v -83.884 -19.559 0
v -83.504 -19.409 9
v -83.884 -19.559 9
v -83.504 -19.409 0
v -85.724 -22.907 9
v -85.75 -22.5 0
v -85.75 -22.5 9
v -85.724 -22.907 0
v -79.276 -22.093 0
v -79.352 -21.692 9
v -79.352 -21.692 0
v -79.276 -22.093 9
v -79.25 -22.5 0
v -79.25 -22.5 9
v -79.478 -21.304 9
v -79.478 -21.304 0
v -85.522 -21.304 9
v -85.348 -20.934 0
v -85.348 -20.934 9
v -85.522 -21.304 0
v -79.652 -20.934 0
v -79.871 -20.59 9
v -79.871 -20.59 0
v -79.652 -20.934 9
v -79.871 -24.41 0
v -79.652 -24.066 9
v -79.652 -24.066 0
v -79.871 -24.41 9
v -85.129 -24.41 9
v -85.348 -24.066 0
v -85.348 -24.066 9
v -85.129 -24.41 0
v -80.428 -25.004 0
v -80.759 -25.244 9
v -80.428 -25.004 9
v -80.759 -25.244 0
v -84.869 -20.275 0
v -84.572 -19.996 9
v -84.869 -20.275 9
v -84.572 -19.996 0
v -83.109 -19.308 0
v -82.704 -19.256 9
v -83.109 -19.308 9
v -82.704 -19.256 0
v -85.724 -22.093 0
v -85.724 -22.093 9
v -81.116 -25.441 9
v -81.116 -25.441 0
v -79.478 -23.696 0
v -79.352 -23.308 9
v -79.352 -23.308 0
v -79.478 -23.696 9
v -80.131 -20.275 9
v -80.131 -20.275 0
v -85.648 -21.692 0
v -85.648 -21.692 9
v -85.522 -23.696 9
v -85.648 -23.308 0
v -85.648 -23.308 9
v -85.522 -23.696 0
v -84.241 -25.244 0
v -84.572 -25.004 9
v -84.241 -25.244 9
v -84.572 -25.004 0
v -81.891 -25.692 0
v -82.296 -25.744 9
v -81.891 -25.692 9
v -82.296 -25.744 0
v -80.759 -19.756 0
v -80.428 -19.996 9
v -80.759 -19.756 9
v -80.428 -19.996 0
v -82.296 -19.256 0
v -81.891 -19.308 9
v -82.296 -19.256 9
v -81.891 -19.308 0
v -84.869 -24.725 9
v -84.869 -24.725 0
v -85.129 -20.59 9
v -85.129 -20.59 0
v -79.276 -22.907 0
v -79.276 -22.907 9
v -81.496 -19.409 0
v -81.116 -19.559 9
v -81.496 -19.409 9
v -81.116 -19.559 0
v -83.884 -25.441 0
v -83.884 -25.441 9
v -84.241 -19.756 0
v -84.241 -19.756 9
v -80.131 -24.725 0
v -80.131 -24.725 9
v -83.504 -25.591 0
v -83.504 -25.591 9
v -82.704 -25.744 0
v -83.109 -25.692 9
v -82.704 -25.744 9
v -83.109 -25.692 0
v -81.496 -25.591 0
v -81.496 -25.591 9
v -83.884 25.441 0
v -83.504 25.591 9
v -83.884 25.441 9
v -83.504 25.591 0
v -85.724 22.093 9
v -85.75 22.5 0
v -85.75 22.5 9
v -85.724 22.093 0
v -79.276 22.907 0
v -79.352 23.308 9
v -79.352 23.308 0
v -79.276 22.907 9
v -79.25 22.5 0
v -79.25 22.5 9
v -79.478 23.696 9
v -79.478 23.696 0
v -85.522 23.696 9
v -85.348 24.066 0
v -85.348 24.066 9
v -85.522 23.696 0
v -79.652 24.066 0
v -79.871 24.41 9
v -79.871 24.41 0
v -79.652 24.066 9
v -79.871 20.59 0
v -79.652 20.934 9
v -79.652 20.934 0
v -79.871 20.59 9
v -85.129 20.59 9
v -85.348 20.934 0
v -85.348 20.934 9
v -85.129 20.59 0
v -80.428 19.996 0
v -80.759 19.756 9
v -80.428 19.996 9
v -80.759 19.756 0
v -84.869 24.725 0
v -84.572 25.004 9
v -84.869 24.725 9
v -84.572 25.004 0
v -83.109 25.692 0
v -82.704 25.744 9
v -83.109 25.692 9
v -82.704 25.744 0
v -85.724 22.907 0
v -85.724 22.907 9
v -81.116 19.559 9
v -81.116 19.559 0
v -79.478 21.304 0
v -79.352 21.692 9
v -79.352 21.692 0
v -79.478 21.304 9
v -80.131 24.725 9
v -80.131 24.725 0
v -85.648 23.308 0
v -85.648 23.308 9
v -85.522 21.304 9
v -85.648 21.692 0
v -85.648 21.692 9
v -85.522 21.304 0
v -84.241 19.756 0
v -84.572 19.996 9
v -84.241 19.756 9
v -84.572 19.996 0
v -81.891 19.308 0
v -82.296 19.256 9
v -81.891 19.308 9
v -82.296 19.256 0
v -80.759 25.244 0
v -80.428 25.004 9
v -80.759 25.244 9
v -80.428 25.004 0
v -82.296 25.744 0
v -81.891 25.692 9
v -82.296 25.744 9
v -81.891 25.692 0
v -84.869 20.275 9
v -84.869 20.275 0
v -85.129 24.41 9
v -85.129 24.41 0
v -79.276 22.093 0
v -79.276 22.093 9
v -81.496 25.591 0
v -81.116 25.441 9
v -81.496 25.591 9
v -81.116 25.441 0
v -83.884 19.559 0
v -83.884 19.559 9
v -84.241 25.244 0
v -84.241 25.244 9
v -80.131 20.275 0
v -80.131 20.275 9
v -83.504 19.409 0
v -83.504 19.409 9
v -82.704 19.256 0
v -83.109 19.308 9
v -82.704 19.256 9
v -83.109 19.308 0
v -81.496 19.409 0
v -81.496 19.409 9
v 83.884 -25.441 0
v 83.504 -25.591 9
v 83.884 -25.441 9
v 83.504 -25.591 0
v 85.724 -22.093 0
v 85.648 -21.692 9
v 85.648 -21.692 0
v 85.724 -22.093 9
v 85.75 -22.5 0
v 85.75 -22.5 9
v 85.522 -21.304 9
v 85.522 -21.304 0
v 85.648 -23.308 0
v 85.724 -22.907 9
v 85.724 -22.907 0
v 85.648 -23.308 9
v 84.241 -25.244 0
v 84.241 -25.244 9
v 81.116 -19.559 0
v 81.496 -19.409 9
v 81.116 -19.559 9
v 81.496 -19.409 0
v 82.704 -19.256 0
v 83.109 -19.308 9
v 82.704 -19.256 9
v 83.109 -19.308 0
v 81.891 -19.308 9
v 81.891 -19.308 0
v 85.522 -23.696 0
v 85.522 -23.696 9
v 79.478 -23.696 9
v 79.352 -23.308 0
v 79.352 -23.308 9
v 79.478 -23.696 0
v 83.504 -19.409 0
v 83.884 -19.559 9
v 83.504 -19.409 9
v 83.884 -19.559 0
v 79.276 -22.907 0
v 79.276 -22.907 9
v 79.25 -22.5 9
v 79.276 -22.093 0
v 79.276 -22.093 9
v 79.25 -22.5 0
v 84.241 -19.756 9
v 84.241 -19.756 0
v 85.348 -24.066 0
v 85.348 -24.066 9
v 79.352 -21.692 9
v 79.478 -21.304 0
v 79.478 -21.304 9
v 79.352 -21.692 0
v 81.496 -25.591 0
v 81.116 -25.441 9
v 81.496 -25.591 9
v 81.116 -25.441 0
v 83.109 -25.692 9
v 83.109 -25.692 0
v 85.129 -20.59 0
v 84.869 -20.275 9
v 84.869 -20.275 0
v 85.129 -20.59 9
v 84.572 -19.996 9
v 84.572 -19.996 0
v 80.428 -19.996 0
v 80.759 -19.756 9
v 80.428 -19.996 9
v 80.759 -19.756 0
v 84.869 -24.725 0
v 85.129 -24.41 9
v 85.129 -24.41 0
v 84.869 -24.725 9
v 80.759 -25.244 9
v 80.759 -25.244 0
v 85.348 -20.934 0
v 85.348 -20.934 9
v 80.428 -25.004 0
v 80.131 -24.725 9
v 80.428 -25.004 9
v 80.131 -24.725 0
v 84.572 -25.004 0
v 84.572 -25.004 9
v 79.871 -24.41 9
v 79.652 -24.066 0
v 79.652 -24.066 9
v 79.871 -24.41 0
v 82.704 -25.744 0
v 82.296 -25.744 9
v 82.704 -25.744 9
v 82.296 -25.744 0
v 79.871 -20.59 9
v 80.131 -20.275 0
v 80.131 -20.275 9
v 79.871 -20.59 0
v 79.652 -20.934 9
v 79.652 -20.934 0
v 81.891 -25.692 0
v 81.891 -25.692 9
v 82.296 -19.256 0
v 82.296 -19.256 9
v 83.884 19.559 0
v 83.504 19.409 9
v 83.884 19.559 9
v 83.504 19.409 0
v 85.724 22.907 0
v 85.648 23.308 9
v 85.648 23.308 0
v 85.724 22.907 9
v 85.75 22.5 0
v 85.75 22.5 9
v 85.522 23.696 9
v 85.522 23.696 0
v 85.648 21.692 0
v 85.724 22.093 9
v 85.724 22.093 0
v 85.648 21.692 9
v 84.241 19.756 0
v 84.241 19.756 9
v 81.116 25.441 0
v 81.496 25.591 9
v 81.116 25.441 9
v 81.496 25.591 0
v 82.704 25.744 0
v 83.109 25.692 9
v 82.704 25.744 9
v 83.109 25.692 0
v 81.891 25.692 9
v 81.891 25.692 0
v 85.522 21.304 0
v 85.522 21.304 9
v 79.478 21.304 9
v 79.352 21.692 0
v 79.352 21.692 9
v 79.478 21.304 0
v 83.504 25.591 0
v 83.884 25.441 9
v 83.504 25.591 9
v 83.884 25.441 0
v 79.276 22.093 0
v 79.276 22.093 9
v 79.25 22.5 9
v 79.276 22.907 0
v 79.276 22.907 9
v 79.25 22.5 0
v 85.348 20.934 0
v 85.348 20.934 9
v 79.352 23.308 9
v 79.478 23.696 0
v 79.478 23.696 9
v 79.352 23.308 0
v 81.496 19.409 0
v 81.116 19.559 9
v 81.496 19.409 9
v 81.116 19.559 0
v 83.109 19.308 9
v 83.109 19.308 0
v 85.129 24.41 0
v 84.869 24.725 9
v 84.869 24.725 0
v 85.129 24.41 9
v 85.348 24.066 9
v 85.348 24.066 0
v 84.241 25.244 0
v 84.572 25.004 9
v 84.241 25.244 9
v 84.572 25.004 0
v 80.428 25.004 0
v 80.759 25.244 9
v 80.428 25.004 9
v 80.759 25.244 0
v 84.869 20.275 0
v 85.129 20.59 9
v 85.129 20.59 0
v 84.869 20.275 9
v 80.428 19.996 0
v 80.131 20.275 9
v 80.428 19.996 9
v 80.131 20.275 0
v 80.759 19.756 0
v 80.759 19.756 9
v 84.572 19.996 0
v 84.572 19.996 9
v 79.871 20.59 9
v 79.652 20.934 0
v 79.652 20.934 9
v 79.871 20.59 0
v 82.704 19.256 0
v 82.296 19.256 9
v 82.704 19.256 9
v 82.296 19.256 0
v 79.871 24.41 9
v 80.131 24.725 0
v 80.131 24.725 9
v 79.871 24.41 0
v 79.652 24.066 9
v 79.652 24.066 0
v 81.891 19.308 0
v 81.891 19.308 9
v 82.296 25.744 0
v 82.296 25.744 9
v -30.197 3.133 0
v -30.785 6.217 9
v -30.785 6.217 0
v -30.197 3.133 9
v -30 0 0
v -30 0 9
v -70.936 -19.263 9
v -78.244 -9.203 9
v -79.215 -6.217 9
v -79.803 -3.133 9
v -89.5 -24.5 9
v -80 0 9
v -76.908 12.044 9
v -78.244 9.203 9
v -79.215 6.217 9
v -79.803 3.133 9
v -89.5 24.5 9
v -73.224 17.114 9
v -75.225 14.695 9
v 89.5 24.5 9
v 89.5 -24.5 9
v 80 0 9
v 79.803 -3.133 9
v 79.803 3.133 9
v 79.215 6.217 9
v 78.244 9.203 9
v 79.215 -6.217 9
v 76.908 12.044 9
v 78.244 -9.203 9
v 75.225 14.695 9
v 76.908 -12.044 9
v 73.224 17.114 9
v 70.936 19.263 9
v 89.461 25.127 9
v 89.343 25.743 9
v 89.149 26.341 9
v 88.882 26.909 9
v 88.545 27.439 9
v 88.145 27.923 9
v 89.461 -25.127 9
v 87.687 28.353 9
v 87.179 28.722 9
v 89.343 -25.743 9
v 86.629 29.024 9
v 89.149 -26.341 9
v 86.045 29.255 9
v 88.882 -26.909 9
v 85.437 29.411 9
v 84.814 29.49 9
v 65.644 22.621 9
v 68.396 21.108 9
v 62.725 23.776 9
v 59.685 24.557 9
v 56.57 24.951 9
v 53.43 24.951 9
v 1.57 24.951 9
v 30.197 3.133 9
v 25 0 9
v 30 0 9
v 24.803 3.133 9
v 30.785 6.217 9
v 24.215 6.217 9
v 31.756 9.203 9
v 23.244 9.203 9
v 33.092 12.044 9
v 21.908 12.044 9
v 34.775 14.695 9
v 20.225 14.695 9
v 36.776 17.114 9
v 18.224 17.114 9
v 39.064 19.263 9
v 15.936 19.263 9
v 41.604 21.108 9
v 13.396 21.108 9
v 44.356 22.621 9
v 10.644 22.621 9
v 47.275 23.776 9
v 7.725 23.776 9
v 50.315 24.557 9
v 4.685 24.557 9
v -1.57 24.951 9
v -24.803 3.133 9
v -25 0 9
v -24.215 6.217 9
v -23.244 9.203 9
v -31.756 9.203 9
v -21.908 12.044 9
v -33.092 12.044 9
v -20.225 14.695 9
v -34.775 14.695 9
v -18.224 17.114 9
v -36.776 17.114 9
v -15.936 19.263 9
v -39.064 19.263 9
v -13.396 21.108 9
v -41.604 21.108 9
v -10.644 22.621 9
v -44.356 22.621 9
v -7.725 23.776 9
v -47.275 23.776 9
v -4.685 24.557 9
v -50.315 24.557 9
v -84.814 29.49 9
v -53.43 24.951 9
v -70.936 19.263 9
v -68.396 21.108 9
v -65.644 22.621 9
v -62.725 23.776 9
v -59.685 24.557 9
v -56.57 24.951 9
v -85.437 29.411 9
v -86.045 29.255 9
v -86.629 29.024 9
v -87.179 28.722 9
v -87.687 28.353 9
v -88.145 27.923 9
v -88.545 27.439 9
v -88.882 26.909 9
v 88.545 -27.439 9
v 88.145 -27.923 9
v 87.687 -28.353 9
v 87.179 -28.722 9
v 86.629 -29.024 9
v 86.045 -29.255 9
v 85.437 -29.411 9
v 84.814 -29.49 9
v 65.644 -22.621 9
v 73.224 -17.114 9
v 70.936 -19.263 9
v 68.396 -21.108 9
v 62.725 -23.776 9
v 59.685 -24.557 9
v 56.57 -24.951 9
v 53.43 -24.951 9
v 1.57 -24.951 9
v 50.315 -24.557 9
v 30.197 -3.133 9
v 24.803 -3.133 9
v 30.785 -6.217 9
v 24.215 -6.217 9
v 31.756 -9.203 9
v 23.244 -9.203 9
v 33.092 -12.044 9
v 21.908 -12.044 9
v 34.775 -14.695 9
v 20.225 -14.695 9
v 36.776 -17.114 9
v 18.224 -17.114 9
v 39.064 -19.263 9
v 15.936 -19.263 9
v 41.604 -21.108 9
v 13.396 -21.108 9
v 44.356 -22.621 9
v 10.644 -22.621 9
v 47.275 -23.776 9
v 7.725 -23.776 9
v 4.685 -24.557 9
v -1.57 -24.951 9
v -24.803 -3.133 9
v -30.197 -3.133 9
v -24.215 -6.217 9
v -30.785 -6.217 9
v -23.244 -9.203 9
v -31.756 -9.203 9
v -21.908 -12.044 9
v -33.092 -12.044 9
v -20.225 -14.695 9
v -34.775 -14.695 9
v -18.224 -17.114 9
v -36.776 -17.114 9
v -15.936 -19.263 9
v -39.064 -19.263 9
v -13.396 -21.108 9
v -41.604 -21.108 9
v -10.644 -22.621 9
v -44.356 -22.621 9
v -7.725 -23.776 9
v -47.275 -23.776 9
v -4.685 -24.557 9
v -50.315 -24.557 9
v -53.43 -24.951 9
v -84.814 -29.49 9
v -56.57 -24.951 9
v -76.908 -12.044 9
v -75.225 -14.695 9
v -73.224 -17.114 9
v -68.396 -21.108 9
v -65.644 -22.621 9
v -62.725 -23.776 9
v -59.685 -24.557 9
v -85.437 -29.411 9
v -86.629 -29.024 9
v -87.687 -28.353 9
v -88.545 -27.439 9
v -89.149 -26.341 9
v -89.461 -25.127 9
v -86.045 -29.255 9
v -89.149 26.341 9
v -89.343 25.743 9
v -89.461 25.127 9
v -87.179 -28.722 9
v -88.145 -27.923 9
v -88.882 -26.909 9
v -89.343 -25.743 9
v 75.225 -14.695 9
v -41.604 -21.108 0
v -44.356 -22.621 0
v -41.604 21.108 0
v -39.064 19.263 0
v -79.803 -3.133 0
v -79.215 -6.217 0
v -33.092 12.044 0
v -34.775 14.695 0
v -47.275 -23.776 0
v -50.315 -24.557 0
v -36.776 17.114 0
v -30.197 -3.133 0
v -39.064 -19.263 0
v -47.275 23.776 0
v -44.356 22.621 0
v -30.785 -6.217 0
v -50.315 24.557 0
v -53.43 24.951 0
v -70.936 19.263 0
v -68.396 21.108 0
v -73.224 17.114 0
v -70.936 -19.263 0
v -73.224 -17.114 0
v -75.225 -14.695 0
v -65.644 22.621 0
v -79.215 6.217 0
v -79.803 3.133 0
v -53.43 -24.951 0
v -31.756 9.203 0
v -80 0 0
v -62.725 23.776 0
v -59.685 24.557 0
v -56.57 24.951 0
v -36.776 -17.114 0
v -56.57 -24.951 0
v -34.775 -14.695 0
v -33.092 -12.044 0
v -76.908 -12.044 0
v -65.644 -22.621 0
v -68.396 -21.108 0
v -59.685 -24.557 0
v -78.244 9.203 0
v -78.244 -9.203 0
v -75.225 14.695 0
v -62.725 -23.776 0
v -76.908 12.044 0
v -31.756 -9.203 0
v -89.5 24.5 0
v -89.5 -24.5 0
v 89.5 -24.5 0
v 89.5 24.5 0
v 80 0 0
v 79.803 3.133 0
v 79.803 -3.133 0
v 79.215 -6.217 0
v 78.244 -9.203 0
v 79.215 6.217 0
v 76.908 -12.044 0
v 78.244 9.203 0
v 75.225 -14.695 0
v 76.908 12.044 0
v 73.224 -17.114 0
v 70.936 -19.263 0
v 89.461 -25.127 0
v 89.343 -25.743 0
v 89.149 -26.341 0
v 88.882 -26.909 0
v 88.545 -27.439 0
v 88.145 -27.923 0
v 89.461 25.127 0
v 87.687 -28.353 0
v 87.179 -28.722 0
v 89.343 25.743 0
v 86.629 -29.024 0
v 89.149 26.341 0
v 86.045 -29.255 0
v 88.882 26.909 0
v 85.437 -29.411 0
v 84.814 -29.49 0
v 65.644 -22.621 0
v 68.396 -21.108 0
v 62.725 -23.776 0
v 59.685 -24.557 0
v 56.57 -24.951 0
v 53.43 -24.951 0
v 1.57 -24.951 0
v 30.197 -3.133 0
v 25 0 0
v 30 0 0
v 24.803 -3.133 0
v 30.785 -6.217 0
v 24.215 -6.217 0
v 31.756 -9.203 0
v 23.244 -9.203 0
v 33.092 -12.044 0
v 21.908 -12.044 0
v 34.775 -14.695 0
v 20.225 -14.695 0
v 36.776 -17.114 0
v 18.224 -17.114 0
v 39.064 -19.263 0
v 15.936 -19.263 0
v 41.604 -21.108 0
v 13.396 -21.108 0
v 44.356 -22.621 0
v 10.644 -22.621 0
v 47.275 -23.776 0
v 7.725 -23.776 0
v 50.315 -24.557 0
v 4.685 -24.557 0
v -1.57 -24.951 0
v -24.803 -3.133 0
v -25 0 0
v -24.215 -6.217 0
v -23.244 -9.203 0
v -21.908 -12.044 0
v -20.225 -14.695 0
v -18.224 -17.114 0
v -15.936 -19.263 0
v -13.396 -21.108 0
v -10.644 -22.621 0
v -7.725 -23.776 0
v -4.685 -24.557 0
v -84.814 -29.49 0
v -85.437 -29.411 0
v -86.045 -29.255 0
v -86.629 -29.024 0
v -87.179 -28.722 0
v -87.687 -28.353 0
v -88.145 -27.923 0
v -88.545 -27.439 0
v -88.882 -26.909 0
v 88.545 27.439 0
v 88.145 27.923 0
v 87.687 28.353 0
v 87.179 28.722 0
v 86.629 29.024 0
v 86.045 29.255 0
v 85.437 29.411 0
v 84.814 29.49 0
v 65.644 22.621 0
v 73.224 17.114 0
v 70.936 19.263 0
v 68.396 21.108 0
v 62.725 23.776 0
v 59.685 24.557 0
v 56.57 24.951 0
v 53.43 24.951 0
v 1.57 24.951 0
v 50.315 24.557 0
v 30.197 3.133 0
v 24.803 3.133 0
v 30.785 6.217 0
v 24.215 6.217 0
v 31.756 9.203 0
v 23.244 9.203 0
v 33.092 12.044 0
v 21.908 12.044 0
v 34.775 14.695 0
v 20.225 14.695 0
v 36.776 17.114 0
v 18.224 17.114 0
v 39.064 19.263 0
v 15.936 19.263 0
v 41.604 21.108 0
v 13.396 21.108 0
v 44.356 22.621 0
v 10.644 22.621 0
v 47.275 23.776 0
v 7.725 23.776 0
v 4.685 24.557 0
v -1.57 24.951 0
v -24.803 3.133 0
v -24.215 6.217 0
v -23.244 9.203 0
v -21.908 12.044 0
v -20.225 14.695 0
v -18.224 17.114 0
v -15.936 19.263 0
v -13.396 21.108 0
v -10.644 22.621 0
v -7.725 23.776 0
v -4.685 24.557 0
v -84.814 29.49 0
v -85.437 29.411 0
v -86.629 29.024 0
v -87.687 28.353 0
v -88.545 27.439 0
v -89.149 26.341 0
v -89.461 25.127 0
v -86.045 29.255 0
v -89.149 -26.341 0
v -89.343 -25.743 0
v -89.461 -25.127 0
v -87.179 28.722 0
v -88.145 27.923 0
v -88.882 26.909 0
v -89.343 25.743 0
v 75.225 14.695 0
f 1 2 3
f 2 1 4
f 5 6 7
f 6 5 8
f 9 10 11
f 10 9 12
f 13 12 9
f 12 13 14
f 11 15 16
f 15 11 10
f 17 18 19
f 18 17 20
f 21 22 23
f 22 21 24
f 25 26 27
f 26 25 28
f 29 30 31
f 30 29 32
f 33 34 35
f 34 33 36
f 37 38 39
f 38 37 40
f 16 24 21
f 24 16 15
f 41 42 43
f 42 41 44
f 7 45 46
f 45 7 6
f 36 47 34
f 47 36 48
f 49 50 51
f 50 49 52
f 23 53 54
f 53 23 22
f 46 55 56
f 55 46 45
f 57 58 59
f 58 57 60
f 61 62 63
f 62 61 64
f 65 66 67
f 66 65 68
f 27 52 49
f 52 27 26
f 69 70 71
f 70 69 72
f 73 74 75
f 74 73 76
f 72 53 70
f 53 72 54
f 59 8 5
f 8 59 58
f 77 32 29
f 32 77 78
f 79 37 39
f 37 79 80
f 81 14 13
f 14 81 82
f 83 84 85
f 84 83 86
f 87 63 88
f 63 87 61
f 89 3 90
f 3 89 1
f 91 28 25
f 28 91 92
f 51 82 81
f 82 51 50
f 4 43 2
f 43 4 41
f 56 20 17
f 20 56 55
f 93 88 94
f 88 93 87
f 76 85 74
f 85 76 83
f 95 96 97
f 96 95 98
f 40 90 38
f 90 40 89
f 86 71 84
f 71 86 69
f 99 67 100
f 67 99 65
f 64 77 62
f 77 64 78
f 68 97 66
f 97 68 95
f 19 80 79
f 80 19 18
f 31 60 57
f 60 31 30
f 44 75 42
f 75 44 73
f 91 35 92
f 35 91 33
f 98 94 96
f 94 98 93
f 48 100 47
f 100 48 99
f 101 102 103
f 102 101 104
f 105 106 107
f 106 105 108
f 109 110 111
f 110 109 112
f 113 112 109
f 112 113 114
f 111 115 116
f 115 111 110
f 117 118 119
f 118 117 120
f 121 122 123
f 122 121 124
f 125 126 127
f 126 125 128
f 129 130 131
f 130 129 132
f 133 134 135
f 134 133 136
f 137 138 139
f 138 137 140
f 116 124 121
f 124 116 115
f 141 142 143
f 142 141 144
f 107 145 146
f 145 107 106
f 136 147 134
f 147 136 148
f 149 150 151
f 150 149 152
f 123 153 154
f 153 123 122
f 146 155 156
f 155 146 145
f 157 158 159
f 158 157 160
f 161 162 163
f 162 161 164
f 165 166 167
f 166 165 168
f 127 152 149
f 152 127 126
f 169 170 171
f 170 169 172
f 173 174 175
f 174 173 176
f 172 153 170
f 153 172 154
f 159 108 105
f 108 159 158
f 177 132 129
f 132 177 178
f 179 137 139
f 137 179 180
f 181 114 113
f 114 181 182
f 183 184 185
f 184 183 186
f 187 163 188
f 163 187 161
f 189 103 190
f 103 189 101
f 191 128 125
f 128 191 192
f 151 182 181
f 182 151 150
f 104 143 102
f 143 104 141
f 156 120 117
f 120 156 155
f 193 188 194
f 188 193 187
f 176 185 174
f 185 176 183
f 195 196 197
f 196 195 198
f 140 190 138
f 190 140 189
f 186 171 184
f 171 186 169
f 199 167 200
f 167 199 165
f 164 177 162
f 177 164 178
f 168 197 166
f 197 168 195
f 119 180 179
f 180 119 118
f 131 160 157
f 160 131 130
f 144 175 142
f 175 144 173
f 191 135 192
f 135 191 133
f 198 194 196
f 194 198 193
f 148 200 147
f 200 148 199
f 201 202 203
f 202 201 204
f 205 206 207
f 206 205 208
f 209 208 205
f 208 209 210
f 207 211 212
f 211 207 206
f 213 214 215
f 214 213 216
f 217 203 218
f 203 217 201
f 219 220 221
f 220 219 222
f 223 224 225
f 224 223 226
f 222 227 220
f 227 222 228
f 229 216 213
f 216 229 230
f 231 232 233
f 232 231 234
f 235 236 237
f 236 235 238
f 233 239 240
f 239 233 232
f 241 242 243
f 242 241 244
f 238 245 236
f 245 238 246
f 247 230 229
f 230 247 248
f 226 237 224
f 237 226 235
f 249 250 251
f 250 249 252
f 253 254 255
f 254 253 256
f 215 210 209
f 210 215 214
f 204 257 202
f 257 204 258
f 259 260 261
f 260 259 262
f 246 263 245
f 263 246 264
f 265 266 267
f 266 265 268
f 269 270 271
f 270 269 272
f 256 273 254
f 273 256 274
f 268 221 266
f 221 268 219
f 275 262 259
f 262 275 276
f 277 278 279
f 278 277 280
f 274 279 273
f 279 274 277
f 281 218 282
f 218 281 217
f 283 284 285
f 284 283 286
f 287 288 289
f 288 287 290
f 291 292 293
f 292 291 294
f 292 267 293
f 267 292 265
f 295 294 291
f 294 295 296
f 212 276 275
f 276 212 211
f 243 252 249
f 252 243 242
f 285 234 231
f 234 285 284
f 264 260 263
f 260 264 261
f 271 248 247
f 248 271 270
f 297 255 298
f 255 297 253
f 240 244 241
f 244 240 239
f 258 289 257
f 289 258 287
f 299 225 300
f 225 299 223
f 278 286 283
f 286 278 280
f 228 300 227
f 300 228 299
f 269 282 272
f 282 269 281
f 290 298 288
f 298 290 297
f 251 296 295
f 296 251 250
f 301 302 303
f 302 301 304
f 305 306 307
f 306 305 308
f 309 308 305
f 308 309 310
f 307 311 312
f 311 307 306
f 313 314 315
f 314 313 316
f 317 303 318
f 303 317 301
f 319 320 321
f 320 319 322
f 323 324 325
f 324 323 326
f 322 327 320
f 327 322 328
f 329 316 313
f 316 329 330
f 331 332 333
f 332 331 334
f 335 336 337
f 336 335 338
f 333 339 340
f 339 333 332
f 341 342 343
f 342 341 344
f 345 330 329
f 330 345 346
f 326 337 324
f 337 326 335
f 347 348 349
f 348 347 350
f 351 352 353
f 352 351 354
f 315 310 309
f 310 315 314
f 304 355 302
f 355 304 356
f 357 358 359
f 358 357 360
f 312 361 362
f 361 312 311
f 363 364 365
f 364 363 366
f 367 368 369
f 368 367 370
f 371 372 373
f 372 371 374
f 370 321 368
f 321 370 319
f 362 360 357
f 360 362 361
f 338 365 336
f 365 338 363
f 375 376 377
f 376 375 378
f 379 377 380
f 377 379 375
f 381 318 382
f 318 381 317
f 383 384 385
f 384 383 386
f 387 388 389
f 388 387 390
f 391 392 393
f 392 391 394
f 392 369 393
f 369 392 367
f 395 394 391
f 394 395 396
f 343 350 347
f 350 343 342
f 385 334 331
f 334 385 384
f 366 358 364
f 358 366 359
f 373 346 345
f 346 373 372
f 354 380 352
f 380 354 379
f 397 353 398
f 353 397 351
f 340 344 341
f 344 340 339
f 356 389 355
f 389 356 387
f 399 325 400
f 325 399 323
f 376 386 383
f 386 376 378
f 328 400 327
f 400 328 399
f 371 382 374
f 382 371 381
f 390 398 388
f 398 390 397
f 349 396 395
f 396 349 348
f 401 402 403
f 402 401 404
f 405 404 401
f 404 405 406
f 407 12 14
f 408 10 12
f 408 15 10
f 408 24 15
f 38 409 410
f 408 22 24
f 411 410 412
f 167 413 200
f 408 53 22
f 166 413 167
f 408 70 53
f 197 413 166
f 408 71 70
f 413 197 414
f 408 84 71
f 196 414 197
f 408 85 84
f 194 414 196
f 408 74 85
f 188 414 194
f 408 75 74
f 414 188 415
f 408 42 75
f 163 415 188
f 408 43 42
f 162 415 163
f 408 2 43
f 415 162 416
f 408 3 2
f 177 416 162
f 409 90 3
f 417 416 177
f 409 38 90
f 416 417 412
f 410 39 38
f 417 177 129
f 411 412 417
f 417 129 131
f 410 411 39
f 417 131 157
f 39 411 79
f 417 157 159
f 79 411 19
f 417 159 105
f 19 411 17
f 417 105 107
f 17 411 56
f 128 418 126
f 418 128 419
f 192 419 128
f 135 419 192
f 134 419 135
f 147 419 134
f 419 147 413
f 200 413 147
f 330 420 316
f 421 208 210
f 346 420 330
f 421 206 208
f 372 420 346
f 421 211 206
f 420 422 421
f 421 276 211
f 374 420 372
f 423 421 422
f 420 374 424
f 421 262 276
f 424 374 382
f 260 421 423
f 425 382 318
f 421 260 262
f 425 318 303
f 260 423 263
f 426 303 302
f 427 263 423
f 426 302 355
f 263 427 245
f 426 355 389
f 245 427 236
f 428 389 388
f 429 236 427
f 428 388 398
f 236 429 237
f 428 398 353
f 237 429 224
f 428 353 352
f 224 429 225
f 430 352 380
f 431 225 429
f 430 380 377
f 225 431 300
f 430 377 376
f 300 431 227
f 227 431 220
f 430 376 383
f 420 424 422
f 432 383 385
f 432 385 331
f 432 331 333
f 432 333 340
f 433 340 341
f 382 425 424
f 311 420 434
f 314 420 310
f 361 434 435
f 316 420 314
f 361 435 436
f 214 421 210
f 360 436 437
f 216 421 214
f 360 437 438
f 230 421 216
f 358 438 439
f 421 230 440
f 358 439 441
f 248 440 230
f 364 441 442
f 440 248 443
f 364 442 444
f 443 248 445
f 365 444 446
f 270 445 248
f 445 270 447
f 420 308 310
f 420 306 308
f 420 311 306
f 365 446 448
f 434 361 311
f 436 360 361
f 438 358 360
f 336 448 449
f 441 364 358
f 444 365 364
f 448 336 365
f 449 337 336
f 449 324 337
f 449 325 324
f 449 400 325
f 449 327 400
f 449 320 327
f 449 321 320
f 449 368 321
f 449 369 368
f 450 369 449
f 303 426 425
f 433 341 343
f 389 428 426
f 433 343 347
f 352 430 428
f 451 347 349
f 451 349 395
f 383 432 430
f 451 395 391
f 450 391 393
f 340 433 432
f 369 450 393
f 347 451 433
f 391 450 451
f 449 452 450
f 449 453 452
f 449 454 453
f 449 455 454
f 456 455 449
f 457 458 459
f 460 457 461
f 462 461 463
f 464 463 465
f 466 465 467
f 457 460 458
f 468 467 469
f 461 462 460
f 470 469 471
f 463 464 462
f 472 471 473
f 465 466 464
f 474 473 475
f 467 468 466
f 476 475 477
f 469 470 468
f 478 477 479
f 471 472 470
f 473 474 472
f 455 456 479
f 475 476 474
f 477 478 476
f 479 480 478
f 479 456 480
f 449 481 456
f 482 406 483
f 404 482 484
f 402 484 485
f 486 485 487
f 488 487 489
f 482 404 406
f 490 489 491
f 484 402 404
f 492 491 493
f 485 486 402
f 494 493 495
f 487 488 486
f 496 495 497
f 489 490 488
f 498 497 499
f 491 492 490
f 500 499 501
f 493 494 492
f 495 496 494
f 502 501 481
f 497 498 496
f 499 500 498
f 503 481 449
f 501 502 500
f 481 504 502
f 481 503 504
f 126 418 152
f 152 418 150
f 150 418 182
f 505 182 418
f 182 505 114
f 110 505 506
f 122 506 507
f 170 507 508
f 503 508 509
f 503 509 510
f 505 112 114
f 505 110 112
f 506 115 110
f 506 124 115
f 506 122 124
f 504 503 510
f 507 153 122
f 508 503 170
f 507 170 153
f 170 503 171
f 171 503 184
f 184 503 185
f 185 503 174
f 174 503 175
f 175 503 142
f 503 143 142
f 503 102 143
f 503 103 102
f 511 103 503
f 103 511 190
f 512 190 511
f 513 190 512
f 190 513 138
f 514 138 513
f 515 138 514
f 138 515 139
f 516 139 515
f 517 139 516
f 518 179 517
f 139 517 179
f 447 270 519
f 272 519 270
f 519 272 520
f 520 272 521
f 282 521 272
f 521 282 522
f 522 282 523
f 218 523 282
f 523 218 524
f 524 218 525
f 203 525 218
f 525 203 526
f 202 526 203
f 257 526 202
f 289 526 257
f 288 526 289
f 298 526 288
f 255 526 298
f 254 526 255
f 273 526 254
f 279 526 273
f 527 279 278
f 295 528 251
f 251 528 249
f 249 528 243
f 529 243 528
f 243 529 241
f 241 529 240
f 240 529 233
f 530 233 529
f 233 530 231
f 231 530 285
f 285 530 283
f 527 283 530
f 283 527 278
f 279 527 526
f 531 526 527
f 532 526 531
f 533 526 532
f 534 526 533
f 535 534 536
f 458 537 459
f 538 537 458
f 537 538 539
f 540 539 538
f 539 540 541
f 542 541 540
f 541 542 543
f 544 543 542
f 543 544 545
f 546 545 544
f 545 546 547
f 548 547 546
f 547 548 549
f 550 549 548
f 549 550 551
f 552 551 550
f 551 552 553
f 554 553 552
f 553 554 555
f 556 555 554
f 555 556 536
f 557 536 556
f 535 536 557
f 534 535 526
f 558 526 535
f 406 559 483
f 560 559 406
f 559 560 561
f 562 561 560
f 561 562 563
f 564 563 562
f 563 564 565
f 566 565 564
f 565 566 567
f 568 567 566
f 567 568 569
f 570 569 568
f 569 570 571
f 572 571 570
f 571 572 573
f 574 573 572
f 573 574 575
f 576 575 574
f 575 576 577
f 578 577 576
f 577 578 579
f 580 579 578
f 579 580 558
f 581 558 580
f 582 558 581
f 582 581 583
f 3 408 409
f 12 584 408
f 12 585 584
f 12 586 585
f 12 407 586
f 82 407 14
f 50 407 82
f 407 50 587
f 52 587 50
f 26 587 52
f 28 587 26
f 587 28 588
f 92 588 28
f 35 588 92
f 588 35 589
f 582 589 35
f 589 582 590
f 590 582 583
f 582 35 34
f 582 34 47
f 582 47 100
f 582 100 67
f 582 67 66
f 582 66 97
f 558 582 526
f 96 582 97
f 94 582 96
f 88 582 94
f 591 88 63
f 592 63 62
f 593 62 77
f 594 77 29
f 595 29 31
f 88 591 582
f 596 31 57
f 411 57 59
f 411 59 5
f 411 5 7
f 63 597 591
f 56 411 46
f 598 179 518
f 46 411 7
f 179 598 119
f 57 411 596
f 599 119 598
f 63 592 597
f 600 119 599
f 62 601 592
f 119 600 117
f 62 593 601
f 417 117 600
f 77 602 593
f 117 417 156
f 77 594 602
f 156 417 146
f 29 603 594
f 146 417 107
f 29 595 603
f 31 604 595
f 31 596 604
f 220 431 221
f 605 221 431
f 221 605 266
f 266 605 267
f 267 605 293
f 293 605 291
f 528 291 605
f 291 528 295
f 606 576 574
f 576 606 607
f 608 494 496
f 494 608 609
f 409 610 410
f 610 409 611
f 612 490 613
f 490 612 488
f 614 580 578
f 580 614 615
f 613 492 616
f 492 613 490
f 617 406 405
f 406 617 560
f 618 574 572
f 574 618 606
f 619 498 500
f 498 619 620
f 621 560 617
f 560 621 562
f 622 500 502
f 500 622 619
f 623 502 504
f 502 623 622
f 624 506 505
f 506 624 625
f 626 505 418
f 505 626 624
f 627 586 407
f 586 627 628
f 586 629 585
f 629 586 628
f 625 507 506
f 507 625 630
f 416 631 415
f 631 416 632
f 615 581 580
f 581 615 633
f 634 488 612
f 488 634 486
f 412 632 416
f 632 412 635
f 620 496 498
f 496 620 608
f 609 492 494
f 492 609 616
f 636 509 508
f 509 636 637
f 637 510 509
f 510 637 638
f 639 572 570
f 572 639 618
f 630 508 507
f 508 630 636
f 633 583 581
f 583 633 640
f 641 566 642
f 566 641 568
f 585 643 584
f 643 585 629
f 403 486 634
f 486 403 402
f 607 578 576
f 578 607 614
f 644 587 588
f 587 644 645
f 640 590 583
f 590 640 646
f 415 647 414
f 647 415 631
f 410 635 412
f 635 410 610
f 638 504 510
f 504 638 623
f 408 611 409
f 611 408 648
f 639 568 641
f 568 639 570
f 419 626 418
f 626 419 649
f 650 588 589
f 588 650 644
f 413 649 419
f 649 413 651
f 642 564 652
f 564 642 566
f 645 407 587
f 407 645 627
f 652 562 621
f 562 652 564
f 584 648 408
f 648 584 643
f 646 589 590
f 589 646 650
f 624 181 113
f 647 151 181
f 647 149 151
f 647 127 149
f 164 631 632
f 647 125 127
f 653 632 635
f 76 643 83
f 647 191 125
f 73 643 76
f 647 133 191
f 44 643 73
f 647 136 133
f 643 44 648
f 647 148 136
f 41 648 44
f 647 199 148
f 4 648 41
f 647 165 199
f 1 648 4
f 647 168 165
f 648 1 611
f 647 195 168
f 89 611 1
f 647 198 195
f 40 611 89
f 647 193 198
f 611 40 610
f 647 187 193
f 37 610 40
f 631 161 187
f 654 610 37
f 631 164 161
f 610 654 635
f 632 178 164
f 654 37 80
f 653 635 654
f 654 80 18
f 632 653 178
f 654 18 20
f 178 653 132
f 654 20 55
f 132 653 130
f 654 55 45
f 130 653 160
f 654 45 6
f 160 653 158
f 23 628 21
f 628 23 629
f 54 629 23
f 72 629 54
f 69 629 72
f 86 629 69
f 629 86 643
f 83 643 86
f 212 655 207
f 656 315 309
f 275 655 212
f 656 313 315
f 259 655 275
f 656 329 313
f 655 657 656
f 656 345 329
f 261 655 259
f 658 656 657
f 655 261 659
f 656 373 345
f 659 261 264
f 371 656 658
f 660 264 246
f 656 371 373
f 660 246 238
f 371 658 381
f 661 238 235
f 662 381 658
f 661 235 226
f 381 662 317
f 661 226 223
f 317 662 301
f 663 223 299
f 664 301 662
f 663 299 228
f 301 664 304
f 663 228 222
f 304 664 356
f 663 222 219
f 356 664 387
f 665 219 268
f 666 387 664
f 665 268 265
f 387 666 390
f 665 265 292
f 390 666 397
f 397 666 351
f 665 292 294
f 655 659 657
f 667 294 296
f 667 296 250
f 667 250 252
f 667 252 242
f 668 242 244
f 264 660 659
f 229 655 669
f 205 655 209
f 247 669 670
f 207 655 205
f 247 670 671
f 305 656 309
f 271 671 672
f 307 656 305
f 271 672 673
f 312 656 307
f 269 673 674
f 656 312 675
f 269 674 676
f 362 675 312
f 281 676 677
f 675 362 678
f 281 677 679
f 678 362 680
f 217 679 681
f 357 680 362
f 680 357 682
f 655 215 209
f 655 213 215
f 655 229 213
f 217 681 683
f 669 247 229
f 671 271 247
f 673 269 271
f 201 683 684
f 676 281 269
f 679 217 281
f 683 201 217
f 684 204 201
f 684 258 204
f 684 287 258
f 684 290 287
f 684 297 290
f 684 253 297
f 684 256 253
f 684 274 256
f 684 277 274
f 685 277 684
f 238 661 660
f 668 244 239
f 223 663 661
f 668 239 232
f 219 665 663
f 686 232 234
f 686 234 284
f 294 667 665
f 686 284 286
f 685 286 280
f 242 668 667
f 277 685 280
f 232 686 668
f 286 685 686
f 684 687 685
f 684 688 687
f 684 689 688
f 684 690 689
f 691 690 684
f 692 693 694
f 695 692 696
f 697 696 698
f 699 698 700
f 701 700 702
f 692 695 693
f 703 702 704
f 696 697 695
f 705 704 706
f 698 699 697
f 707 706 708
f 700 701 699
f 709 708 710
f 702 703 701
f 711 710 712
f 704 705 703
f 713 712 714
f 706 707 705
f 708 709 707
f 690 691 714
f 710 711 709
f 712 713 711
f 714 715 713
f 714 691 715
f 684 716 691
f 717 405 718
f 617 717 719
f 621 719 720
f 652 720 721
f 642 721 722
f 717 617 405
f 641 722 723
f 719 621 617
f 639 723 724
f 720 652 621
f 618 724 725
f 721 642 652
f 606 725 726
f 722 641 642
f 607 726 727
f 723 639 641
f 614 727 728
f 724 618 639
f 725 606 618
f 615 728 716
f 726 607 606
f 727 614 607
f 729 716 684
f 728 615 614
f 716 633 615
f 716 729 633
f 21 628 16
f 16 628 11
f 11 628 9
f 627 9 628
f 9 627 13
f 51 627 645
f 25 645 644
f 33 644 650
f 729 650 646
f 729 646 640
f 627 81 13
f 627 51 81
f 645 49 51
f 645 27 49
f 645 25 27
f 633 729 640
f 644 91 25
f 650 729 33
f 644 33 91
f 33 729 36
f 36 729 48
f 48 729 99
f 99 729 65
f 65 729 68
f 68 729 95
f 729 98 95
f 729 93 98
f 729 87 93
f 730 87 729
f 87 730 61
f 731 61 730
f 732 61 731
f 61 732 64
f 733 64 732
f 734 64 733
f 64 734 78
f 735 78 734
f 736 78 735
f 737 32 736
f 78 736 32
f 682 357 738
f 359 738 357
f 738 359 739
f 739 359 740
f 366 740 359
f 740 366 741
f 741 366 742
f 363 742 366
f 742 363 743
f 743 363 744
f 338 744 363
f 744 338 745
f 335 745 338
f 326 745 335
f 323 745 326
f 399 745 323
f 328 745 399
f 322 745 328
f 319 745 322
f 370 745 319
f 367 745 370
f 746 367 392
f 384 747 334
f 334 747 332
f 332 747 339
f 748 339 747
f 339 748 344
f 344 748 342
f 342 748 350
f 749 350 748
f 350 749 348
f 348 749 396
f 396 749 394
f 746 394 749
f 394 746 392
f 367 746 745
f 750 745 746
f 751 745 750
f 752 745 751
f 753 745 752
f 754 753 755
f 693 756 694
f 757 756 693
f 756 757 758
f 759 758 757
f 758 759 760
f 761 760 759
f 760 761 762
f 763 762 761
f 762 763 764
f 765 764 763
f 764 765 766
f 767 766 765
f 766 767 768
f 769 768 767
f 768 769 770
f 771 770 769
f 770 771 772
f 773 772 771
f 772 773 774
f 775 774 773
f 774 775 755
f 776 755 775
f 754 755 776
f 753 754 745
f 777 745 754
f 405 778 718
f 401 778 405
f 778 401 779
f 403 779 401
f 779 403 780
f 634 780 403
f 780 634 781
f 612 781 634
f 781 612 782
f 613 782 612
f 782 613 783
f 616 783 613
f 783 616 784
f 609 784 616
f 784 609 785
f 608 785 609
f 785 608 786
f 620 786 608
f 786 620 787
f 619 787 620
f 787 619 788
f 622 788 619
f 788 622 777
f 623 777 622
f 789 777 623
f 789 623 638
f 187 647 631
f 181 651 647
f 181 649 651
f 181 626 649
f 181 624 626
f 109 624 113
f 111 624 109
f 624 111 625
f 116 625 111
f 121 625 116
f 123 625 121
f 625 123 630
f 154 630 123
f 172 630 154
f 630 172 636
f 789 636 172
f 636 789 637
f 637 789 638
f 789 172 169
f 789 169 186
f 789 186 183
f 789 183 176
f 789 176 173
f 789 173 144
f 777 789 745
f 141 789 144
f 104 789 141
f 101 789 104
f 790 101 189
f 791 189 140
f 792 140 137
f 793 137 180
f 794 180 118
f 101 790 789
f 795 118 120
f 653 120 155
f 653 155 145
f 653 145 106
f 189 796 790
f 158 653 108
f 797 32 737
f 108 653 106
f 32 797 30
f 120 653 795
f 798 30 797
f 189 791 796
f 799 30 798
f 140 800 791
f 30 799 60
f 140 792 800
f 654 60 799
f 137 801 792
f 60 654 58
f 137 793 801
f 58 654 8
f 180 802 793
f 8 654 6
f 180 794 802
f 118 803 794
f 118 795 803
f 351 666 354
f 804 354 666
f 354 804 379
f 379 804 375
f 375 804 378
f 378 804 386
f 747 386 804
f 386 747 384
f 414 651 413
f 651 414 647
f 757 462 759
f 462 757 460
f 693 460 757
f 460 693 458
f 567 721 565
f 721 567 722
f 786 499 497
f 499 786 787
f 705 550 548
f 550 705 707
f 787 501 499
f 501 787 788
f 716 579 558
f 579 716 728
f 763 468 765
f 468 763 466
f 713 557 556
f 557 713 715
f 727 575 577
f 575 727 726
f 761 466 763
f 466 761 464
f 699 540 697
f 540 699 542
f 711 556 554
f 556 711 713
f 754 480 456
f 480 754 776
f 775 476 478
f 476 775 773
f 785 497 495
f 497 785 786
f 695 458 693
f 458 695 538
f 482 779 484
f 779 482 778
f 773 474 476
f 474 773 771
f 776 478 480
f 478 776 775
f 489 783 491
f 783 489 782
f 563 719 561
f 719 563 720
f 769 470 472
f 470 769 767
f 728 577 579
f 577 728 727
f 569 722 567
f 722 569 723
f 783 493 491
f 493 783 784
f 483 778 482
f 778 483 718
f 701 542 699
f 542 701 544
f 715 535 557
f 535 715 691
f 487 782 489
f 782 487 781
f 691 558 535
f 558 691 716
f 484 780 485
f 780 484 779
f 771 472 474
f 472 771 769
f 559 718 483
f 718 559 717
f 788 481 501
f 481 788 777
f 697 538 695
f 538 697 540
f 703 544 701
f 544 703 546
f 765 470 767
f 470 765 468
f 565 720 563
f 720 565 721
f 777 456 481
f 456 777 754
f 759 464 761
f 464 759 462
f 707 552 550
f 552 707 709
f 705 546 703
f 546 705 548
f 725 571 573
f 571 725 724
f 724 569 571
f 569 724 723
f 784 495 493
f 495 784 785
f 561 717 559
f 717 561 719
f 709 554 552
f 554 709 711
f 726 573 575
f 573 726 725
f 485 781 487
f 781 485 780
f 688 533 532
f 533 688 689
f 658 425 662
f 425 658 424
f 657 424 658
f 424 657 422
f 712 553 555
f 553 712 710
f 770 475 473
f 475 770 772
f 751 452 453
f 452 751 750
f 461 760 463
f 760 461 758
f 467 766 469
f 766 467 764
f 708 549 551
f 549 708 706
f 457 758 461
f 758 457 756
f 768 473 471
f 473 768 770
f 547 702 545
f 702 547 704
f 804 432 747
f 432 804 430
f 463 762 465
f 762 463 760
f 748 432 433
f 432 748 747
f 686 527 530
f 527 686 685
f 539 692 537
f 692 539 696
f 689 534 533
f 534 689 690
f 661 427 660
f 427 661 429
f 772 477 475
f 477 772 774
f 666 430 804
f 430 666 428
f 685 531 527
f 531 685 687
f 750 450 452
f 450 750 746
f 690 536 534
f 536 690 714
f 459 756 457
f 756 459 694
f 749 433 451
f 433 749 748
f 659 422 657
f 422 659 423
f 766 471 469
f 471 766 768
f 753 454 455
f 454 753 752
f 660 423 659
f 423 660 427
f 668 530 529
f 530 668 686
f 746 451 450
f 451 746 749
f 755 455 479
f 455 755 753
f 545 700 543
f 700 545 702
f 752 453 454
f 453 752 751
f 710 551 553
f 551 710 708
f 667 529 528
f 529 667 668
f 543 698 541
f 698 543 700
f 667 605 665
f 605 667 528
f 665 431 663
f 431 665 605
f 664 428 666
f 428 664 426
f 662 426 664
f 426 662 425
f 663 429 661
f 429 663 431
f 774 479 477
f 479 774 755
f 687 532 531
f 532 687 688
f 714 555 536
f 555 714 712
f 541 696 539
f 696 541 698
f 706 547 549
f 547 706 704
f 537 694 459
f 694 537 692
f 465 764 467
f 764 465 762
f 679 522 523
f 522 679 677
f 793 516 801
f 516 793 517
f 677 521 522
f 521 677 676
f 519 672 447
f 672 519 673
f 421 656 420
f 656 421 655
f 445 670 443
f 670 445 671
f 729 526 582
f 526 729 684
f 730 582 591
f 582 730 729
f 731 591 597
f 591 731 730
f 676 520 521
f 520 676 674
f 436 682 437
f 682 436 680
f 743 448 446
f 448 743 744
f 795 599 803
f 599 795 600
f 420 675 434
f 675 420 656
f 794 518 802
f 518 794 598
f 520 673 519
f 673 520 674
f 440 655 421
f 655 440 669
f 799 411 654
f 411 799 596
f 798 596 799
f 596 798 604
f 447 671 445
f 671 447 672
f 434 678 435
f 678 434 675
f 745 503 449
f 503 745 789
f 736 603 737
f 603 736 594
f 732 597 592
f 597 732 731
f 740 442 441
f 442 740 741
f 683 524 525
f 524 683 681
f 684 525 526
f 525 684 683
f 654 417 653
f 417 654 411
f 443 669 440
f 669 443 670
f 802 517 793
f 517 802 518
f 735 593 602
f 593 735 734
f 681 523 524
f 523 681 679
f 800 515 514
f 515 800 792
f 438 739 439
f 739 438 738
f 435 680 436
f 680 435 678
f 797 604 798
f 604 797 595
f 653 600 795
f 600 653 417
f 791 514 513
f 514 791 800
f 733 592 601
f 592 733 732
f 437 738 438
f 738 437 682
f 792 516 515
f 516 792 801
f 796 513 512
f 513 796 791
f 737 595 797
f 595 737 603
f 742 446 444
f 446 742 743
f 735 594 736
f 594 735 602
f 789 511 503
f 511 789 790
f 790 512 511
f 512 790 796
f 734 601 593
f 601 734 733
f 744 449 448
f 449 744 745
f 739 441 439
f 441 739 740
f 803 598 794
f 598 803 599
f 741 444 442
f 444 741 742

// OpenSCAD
$fn = 50;

difference() {
	union() {
		hull() {
			translate(v = [-84.5, 24.5, 0]) {
				cylinder(h = 9, r = 5);
			}
			translate(v = [84.5, 24.5, 0]) {
				cylinder(h = 9, r = 5);
			}
			translate(v = [-84.5, -24.5, 0]) {
				cylinder(h = 9, r = 5);
			}
			translate(v = [84.5, -24.5, 0]) {
				cylinder(h = 9, r = 5);
			}
		}
	}
	union() {
		translate(v = [-82.5, -22.5, -100.0]) {
			cylinder(h = 200, r = 3.25);
		}
		translate(v = [-82.5, 22.5, -100.0]) {
			cylinder(h = 200, r = 3.25);
		}
		translate(v = [82.5, -22.5, -100.0]) {
			cylinder(h = 200, r = 3.25);
		}
		translate(v = [82.5, 22.5, -100.0]) {
			cylinder(h = 200, r = 3.25);
		}
		translate(v = [-82.5, -22.5, -100.0]) {
			cylinder(h = 200, r = 1.8);
		}
		translate(v = [-82.5, 22.5, -100.0]) {
			cylinder(h = 200, r = 1.8);
		}
		translate(v = [82.5, -22.5, -100.0]) {
			cylinder(h = 200, r = 1.8);
		}
		translate(v = [82.5, 22.5, -100.0]) {
			cylinder(h = 200, r = 1.8);
		}
		translate(v = [-55.0, 0, 0.0]) {
			cylinder(h = 9, r = 25.0);
		}
		cylinder(h = 9, r = 25.0);
		translate(v = [55.0, 0, 0.0]) {
			cylinder(h = 9, r = 25.0);
		}
	}
}
